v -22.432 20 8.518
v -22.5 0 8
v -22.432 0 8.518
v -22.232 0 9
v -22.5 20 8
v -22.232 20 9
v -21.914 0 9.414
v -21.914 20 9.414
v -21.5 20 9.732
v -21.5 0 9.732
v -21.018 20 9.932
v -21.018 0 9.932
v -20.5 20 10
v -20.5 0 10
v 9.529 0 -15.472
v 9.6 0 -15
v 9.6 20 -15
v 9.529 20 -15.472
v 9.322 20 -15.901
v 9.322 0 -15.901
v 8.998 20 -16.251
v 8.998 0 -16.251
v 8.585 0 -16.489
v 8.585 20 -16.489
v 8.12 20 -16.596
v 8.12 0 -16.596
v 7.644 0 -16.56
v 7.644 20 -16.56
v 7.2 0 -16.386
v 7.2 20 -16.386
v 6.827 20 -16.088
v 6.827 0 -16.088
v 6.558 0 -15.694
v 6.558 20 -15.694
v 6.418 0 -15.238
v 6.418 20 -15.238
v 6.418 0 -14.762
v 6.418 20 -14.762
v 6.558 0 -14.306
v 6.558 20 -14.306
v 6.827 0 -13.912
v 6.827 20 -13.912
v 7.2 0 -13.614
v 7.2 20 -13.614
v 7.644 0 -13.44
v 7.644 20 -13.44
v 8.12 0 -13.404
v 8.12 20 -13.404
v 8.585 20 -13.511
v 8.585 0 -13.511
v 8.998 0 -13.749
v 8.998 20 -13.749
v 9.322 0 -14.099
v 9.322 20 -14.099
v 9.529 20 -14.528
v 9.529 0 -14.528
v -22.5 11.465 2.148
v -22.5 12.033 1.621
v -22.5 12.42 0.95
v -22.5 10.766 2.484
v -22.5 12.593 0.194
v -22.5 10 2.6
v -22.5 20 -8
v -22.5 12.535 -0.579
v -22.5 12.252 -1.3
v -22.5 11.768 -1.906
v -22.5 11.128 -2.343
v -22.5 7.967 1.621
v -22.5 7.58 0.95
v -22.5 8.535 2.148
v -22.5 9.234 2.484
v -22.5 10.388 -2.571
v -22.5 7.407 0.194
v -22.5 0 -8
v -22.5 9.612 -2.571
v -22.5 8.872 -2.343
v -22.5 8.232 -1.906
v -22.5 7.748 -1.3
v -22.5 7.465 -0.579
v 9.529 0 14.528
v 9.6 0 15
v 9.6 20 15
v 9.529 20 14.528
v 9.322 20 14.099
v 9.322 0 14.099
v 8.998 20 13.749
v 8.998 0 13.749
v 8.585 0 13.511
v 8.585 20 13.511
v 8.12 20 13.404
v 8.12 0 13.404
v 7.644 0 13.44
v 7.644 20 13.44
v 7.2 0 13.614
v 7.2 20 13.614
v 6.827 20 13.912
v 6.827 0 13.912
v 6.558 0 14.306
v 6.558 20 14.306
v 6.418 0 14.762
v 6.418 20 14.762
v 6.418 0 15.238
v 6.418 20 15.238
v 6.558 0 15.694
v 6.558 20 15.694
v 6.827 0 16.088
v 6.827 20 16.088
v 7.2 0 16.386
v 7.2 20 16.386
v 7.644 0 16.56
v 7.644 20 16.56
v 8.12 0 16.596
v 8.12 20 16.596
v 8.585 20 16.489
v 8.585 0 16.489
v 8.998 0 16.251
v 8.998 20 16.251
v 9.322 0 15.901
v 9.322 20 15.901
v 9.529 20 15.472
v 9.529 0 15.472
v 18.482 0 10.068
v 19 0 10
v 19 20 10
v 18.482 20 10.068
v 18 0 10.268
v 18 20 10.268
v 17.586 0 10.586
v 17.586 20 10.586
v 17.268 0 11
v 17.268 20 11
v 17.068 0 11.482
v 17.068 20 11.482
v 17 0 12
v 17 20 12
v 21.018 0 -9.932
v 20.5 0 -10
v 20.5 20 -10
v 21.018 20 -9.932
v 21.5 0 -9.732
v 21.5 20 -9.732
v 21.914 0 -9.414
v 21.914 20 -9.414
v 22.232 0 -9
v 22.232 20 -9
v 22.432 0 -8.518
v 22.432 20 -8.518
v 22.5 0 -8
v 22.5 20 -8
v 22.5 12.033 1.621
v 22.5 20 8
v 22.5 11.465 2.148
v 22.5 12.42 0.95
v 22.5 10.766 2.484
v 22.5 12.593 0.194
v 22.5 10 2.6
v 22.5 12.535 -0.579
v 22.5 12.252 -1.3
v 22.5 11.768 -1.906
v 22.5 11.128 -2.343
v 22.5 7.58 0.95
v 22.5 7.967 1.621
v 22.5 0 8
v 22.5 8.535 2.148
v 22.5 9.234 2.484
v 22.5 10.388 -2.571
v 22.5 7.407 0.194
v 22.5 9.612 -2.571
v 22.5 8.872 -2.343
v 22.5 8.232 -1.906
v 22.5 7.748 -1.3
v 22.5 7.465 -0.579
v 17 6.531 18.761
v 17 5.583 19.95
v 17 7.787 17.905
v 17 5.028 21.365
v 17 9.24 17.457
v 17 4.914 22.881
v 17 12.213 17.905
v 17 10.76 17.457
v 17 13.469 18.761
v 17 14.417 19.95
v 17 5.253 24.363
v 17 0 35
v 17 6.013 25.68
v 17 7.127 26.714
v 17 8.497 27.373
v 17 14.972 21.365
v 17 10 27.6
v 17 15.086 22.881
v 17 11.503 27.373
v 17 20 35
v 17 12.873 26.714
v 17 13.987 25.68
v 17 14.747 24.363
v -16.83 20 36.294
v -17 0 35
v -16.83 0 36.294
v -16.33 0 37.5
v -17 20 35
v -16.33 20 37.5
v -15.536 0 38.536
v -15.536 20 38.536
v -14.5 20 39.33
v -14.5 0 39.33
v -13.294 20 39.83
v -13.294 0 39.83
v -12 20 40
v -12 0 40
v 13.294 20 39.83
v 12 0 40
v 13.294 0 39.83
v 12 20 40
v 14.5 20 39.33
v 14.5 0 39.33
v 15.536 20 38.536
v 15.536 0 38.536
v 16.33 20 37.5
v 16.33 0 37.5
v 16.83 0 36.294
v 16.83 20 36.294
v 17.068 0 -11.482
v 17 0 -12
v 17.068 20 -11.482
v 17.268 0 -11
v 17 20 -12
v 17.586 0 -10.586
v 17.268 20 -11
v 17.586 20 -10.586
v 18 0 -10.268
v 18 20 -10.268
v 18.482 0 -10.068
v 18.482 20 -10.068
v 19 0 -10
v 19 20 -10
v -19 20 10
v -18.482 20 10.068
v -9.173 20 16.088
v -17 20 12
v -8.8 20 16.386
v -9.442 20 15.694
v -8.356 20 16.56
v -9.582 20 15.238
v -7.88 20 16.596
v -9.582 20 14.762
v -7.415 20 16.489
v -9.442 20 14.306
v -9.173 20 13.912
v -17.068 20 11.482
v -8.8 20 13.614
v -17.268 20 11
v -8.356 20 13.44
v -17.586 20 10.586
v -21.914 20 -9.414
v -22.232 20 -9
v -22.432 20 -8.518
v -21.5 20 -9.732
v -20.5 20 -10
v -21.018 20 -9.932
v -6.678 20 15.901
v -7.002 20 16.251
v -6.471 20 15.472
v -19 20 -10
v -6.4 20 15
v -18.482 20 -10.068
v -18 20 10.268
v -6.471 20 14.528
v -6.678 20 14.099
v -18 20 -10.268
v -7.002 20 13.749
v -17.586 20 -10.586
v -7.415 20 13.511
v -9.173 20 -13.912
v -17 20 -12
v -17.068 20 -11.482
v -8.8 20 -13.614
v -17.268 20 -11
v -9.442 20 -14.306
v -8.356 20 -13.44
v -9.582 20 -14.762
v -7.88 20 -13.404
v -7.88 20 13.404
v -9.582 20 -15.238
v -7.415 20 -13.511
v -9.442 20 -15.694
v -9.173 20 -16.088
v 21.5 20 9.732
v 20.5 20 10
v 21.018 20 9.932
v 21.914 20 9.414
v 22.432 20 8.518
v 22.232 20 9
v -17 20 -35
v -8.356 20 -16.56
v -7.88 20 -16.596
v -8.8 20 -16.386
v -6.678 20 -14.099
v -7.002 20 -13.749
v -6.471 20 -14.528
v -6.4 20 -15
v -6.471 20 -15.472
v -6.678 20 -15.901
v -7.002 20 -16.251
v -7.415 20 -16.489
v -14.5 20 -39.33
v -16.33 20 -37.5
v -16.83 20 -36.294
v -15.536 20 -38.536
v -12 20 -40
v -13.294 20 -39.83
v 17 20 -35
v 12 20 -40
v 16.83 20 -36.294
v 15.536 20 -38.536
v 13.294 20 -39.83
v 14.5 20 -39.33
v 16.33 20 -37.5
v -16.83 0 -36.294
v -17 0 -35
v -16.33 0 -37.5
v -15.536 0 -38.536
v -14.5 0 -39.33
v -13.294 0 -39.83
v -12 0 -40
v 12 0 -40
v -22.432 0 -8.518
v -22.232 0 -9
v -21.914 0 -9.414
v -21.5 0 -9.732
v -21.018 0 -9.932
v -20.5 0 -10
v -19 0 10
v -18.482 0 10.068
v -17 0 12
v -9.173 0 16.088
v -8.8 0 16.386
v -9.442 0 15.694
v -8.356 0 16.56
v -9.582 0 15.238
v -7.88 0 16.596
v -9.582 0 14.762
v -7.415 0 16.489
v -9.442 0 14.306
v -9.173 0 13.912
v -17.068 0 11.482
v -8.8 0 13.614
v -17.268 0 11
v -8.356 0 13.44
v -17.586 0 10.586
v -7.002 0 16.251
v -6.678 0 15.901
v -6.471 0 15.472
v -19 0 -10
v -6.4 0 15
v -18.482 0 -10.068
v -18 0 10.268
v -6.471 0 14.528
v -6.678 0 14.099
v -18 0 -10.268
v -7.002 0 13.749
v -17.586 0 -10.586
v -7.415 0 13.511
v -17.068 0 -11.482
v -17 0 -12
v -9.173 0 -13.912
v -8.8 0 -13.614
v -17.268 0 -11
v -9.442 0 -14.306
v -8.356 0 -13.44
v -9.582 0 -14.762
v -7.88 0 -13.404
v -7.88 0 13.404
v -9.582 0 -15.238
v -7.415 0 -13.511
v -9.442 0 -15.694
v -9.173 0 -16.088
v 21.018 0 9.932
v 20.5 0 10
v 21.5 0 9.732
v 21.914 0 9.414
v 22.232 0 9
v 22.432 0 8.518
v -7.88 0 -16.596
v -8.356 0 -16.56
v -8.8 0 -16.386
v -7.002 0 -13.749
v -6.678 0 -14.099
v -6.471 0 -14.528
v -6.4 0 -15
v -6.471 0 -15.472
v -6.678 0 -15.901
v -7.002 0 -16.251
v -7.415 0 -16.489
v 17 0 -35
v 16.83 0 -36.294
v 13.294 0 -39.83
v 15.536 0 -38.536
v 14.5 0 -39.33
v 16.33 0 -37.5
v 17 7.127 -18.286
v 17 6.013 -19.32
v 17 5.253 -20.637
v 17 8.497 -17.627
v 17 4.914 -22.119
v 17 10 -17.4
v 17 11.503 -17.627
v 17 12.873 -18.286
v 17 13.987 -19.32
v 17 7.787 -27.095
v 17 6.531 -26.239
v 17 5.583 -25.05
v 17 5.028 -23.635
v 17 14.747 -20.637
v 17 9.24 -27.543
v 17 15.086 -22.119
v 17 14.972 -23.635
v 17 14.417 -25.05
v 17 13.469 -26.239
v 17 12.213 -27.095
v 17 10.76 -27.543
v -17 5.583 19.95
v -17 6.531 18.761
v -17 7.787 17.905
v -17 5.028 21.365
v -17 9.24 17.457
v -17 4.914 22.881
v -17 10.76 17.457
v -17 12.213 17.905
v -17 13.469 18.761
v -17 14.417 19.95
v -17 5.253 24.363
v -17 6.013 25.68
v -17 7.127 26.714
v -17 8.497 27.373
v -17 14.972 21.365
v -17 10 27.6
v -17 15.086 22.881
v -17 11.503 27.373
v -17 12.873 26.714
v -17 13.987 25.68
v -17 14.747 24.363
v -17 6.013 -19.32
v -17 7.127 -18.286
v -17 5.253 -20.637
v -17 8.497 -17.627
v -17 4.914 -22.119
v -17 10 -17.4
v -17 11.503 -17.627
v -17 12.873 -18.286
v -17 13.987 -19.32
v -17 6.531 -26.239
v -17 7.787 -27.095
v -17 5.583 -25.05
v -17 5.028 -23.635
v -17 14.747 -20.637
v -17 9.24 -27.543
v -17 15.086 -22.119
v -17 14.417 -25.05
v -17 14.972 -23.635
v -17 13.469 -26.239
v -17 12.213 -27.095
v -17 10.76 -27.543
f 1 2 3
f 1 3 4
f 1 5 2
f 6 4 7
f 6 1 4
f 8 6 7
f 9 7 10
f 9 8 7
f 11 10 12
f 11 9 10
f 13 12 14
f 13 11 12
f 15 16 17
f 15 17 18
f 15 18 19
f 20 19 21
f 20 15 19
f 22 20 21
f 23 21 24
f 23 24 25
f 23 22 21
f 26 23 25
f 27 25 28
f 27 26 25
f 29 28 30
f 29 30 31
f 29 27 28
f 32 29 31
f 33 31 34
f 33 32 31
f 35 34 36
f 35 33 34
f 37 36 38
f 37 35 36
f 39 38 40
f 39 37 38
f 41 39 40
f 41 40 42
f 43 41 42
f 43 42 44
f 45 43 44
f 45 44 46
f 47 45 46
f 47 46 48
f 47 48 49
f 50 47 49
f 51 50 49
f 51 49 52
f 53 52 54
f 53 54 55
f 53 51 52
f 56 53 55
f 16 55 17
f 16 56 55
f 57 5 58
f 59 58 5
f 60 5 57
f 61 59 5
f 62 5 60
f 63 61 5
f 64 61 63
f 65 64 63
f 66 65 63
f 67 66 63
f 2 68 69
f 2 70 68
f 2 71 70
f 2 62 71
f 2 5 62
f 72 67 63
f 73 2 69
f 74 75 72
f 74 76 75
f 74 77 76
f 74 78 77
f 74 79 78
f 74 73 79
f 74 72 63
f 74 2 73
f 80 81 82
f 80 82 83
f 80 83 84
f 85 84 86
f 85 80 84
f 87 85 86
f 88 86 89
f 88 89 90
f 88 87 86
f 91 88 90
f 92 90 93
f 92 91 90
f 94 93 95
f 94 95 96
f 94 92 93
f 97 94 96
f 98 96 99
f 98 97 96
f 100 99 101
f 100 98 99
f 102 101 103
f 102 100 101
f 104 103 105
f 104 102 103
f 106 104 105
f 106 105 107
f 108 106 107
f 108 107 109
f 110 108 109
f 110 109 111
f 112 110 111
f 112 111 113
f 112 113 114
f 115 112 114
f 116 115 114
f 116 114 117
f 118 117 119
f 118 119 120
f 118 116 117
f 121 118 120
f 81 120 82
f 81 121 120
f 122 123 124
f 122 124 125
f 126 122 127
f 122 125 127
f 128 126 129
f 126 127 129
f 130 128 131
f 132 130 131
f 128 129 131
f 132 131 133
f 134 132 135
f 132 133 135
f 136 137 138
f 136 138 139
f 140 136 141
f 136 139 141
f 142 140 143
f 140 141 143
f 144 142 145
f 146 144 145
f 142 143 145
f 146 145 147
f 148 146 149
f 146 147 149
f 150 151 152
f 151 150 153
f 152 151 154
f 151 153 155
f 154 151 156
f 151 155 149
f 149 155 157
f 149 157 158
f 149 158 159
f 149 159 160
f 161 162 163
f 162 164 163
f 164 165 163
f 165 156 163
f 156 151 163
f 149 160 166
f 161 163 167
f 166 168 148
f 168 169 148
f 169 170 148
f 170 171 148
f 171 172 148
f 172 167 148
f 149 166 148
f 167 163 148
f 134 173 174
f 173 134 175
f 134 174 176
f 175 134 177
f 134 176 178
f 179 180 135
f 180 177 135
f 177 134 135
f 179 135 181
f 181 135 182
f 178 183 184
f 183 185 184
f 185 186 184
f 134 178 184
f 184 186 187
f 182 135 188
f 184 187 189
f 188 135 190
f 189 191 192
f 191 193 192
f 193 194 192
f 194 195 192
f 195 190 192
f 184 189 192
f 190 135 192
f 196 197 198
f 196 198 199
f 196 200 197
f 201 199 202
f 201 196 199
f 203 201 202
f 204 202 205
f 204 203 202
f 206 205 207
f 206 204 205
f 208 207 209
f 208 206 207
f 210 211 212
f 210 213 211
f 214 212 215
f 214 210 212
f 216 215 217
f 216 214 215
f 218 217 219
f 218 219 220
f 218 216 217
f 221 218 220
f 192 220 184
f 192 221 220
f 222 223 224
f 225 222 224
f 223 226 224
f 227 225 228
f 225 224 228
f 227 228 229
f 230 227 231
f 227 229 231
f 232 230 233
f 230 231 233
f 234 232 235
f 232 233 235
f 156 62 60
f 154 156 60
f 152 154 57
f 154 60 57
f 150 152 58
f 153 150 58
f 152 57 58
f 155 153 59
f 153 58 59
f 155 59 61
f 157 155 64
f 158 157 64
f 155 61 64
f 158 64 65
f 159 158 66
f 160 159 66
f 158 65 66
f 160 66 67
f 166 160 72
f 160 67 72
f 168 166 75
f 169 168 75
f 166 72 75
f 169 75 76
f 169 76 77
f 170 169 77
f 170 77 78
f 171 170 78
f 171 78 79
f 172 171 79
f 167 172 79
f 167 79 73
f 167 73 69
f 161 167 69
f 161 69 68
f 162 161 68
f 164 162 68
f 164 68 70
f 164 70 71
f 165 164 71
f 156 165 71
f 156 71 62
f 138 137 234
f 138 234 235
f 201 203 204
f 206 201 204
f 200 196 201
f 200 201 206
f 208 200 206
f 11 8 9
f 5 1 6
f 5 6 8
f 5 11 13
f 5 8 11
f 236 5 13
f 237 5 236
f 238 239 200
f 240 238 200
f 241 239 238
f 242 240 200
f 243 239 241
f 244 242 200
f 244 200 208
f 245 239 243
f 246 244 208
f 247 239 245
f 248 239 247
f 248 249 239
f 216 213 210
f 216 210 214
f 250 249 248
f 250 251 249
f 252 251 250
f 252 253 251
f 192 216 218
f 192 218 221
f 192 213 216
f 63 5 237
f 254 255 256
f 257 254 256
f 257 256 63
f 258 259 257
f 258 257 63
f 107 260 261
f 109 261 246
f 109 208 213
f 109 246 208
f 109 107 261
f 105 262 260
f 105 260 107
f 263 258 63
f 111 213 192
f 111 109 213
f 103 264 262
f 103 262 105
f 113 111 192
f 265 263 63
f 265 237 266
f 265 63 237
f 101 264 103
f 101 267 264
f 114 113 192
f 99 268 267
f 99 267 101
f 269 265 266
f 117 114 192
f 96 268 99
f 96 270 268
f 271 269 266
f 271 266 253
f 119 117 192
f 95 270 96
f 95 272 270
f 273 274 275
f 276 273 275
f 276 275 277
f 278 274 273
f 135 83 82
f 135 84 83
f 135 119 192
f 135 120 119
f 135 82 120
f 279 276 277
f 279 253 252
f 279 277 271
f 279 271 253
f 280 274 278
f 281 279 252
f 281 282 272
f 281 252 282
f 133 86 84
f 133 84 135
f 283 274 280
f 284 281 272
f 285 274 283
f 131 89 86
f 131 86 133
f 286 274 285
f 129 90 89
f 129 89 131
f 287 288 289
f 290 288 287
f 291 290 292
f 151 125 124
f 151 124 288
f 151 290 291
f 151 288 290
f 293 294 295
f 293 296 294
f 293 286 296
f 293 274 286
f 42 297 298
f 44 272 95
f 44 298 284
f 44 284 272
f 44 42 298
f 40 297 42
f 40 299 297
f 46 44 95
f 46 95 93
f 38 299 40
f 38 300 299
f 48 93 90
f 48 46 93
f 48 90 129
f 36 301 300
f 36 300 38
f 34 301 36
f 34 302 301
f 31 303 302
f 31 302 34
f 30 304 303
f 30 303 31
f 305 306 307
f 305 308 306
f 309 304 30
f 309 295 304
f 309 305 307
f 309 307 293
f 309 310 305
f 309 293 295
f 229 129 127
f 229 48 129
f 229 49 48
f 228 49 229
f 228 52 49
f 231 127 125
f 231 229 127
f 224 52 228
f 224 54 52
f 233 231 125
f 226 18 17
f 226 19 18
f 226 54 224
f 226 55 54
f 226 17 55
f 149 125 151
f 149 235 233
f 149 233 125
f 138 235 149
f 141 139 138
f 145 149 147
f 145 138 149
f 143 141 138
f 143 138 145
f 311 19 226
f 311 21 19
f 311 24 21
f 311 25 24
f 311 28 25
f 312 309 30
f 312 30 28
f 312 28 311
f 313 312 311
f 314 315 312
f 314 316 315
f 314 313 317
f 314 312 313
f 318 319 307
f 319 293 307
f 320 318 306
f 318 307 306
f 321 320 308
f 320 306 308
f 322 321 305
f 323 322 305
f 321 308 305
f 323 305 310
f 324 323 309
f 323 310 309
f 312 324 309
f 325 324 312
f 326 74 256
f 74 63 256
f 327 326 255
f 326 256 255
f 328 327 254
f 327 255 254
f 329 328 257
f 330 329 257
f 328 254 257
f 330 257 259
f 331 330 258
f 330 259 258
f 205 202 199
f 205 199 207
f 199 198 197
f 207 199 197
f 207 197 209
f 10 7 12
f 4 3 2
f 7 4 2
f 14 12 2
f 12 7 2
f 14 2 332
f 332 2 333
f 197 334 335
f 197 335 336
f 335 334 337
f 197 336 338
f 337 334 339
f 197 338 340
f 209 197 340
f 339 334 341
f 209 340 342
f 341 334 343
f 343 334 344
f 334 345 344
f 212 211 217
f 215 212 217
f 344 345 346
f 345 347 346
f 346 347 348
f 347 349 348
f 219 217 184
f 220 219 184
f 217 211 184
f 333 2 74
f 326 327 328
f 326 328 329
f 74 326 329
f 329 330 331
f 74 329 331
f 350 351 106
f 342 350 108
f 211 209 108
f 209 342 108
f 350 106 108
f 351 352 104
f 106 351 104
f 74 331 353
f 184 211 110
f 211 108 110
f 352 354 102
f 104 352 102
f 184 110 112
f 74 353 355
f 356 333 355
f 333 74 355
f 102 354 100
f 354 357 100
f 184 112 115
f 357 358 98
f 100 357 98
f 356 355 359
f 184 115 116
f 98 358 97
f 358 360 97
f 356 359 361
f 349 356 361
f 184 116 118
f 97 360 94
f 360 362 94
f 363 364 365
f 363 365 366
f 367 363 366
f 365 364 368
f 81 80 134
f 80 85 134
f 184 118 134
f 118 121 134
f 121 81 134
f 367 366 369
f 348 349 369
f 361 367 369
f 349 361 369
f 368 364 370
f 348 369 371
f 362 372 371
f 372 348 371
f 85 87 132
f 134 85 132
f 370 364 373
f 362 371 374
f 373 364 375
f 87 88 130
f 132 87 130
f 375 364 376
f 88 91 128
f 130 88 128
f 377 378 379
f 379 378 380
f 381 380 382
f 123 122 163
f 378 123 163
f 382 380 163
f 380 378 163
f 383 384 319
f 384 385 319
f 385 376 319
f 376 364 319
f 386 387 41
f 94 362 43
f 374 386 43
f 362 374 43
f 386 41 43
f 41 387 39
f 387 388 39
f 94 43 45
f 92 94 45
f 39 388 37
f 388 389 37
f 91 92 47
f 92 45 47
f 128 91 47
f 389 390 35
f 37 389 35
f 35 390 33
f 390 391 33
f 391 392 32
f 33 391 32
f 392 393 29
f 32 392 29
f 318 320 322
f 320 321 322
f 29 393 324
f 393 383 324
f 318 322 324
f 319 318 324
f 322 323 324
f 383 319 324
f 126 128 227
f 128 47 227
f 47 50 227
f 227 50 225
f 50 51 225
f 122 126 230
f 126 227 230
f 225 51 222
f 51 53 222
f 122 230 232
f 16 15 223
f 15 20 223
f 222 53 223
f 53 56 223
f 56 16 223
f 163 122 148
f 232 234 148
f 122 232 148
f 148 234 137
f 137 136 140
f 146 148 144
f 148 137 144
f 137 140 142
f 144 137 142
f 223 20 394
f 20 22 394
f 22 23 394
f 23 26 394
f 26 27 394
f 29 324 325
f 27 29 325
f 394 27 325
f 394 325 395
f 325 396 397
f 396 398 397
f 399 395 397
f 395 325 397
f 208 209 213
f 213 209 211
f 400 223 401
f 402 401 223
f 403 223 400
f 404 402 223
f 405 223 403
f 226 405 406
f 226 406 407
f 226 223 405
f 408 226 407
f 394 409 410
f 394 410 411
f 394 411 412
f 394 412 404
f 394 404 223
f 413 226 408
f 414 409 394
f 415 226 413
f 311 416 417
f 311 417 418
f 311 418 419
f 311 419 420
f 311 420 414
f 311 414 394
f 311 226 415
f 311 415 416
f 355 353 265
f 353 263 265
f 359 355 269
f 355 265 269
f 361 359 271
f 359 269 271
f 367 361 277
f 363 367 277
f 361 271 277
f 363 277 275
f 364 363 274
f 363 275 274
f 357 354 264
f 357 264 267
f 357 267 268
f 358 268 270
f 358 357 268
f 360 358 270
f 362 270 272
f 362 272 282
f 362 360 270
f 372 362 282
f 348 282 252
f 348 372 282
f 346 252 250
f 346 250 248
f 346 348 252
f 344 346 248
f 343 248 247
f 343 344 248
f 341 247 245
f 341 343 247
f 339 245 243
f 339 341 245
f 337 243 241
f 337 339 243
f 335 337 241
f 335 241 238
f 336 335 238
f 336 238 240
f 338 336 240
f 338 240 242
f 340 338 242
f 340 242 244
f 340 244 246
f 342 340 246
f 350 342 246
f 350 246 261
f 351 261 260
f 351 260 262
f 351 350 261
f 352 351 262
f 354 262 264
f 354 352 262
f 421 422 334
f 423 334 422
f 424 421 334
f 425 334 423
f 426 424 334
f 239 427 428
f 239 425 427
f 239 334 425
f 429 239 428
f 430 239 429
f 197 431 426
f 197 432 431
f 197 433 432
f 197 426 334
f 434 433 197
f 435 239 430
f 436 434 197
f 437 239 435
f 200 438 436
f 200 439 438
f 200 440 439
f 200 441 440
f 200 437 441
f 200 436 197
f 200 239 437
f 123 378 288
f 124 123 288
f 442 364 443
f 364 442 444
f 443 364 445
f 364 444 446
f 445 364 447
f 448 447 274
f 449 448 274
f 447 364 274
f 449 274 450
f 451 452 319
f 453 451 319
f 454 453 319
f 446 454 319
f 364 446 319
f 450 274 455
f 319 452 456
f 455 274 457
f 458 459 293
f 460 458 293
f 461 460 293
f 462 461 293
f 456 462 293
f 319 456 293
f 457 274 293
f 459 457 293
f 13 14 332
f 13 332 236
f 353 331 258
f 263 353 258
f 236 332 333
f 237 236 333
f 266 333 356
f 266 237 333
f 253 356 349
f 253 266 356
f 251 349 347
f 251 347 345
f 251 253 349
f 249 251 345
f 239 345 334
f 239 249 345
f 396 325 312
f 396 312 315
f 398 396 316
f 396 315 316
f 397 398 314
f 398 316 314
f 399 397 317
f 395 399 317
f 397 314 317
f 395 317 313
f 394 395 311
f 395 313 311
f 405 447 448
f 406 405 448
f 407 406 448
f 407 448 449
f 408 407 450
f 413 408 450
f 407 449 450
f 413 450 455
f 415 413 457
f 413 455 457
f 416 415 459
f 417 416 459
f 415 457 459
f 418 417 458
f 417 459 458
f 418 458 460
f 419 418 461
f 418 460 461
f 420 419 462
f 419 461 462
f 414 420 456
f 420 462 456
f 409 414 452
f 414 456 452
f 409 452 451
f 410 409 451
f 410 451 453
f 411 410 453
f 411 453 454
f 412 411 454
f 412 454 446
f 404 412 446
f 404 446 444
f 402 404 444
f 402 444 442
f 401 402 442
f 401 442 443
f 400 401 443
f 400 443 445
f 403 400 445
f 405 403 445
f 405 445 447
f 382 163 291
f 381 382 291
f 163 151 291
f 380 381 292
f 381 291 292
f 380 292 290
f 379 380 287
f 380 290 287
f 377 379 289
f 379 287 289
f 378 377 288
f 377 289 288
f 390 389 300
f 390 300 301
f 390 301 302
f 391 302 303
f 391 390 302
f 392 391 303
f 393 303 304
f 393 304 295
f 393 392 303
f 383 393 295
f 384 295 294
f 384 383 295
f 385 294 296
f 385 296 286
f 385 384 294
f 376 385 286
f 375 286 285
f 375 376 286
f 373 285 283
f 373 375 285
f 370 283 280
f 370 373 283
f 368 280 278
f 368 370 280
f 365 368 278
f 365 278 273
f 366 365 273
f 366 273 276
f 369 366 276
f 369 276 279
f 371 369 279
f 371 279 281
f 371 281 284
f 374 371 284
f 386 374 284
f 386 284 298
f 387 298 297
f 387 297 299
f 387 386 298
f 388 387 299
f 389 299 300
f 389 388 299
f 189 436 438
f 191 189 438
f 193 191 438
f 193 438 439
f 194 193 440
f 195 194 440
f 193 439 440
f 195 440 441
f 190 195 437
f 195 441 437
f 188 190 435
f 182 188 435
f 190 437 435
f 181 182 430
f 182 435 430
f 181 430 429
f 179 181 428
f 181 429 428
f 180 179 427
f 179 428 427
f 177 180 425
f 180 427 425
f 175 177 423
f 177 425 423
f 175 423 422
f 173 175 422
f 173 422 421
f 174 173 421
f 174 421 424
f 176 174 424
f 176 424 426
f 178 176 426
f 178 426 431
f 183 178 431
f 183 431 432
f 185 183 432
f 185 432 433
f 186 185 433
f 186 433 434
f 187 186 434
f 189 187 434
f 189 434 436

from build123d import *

# Parameters (mm, degrees)
SKETCH_1_W               = 45
SKETCH_1_H               = 80
SKETCH_1_R               = 1.6
EXTRUDE_471_DEPTH        = 20
SKETCH_2_R               = 2.6
CUT_EXTRUDE_665_DEPTH    = 46
SKETCH_3_R               = 5.1
CUT_EXTRUDE_863_DEPTH    = 46
SKETCH_5_W               = 30
SKETCH_5_H               = 20
CUT_EXTRUDE_1108_DEPTH   = 5.5
MIRROR_2_COPY_1_SKETCH_W = 30
MIRROR_2_COPY_1_SKETCH_H = 20
MIRROR_2_COPY_1_DEPTH    = 5.5
FILLET_2_R               = 2
FILLET_5_R               = 5


with BuildPart() as part:
    # 草图1 → Extrude 471 (new body)
    with BuildSketch(Plane(origin=(0, 0, 0), x_dir=(1, 0, 0), z_dir=(0, 1, 0))):
        Rectangle(SKETCH_1_W, SKETCH_1_H)
        with Locations((8, 15)):
            Circle(SKETCH_1_R, mode=Mode.SUBTRACT)
        with Locations((-8, 15)):
            Circle(SKETCH_1_R, mode=Mode.SUBTRACT)
        with Locations((-8, -15)):
            Circle(SKETCH_1_R, mode=Mode.SUBTRACT)
        with Locations((8, -15)):
            Circle(SKETCH_1_R, mode=Mode.SUBTRACT)
    extrude(amount=EXTRUDE_471_DEPTH)

    # 草图2 → Cut-Extrude 665 (cut, through all)
    with BuildSketch(Plane.ZY.offset(22.5)):
        with Locations((0, 10)):
            Circle(SKETCH_2_R)
    extrude(amount=-CUT_EXTRUDE_665_DEPTH, mode=Mode.SUBTRACT)

    # 草图3 → Cut-Extrude 863 (cut, through all)
    with BuildSketch(Plane.ZY.offset(22.5)):
        with Locations((22.5, 10)):
            Circle(SKETCH_3_R)
        with Locations((-22.5, 10)):
            Circle(SKETCH_3_R)
    extrude(amount=-CUT_EXTRUDE_863_DEPTH, mode=Mode.SUBTRACT)

    # 草图5 → Cut-Extrude 1108 (cut)
    with BuildSketch(Plane.ZY.offset(22.5)):
        with Locations((25, 10)):
            Rectangle(SKETCH_5_W, SKETCH_5_H)
    cut_extrude_1108 = extrude(amount=-CUT_EXTRUDE_1108_DEPTH, mode=Mode.SUBTRACT)

    # 镜向1: Cut-Extrude 1108 across plane
    add(cut_extrude_1108.mirror(Plane(origin=(0, 0, 0), x_dir=(0, 0, 1), z_dir=(1, 0, 0))), mode=Mode.SUBTRACT)

    # 镜向2: Cut-Extrude 1108 across plane
    add(cut_extrude_1108.mirror(Plane.XY), mode=Mode.SUBTRACT)

    # 镜向2 copy 1 sketch → 镜向2 copy 1 (cut)
    with BuildSketch(Plane(origin=(22.5, 0, 0), x_dir=(0, 0, -1), z_dir=(1, 0, 0))):
        with Locations((25, 10)):
            Rectangle(MIRROR_2_COPY_1_SKETCH_W, MIRROR_2_COPY_1_SKETCH_H)
    extrude(amount=-MIRROR_2_COPY_1_DEPTH, mode=Mode.SUBTRACT)

    # 圆角2
    fillet_2_edges = [part.edges().sort_by_distance(p)[0] for p in [
        (-22.5, 10, 10),
        (-17, 10, 10),
        (17, 10, 10),
        (22.5, 10, 10),
        (22.5, 10, -10),
        (17, 10, -10),
        (-17, 10, -10),
        (-22.5, 10, -10),
    ]]
    fillet(fillet_2_edges, radius=FILLET_2_R)

    # 圆角5
    fillet_5_edges = [part.edges().sort_by_distance(p)[0] for p in [
        (-17, 10, 40),
        (17, 10, 40),
        (17, 10, -40),
        (-17, 10, -40),
    ]]
    fillet(fillet_5_edges, radius=FILLET_5_R)


solid = part.part
